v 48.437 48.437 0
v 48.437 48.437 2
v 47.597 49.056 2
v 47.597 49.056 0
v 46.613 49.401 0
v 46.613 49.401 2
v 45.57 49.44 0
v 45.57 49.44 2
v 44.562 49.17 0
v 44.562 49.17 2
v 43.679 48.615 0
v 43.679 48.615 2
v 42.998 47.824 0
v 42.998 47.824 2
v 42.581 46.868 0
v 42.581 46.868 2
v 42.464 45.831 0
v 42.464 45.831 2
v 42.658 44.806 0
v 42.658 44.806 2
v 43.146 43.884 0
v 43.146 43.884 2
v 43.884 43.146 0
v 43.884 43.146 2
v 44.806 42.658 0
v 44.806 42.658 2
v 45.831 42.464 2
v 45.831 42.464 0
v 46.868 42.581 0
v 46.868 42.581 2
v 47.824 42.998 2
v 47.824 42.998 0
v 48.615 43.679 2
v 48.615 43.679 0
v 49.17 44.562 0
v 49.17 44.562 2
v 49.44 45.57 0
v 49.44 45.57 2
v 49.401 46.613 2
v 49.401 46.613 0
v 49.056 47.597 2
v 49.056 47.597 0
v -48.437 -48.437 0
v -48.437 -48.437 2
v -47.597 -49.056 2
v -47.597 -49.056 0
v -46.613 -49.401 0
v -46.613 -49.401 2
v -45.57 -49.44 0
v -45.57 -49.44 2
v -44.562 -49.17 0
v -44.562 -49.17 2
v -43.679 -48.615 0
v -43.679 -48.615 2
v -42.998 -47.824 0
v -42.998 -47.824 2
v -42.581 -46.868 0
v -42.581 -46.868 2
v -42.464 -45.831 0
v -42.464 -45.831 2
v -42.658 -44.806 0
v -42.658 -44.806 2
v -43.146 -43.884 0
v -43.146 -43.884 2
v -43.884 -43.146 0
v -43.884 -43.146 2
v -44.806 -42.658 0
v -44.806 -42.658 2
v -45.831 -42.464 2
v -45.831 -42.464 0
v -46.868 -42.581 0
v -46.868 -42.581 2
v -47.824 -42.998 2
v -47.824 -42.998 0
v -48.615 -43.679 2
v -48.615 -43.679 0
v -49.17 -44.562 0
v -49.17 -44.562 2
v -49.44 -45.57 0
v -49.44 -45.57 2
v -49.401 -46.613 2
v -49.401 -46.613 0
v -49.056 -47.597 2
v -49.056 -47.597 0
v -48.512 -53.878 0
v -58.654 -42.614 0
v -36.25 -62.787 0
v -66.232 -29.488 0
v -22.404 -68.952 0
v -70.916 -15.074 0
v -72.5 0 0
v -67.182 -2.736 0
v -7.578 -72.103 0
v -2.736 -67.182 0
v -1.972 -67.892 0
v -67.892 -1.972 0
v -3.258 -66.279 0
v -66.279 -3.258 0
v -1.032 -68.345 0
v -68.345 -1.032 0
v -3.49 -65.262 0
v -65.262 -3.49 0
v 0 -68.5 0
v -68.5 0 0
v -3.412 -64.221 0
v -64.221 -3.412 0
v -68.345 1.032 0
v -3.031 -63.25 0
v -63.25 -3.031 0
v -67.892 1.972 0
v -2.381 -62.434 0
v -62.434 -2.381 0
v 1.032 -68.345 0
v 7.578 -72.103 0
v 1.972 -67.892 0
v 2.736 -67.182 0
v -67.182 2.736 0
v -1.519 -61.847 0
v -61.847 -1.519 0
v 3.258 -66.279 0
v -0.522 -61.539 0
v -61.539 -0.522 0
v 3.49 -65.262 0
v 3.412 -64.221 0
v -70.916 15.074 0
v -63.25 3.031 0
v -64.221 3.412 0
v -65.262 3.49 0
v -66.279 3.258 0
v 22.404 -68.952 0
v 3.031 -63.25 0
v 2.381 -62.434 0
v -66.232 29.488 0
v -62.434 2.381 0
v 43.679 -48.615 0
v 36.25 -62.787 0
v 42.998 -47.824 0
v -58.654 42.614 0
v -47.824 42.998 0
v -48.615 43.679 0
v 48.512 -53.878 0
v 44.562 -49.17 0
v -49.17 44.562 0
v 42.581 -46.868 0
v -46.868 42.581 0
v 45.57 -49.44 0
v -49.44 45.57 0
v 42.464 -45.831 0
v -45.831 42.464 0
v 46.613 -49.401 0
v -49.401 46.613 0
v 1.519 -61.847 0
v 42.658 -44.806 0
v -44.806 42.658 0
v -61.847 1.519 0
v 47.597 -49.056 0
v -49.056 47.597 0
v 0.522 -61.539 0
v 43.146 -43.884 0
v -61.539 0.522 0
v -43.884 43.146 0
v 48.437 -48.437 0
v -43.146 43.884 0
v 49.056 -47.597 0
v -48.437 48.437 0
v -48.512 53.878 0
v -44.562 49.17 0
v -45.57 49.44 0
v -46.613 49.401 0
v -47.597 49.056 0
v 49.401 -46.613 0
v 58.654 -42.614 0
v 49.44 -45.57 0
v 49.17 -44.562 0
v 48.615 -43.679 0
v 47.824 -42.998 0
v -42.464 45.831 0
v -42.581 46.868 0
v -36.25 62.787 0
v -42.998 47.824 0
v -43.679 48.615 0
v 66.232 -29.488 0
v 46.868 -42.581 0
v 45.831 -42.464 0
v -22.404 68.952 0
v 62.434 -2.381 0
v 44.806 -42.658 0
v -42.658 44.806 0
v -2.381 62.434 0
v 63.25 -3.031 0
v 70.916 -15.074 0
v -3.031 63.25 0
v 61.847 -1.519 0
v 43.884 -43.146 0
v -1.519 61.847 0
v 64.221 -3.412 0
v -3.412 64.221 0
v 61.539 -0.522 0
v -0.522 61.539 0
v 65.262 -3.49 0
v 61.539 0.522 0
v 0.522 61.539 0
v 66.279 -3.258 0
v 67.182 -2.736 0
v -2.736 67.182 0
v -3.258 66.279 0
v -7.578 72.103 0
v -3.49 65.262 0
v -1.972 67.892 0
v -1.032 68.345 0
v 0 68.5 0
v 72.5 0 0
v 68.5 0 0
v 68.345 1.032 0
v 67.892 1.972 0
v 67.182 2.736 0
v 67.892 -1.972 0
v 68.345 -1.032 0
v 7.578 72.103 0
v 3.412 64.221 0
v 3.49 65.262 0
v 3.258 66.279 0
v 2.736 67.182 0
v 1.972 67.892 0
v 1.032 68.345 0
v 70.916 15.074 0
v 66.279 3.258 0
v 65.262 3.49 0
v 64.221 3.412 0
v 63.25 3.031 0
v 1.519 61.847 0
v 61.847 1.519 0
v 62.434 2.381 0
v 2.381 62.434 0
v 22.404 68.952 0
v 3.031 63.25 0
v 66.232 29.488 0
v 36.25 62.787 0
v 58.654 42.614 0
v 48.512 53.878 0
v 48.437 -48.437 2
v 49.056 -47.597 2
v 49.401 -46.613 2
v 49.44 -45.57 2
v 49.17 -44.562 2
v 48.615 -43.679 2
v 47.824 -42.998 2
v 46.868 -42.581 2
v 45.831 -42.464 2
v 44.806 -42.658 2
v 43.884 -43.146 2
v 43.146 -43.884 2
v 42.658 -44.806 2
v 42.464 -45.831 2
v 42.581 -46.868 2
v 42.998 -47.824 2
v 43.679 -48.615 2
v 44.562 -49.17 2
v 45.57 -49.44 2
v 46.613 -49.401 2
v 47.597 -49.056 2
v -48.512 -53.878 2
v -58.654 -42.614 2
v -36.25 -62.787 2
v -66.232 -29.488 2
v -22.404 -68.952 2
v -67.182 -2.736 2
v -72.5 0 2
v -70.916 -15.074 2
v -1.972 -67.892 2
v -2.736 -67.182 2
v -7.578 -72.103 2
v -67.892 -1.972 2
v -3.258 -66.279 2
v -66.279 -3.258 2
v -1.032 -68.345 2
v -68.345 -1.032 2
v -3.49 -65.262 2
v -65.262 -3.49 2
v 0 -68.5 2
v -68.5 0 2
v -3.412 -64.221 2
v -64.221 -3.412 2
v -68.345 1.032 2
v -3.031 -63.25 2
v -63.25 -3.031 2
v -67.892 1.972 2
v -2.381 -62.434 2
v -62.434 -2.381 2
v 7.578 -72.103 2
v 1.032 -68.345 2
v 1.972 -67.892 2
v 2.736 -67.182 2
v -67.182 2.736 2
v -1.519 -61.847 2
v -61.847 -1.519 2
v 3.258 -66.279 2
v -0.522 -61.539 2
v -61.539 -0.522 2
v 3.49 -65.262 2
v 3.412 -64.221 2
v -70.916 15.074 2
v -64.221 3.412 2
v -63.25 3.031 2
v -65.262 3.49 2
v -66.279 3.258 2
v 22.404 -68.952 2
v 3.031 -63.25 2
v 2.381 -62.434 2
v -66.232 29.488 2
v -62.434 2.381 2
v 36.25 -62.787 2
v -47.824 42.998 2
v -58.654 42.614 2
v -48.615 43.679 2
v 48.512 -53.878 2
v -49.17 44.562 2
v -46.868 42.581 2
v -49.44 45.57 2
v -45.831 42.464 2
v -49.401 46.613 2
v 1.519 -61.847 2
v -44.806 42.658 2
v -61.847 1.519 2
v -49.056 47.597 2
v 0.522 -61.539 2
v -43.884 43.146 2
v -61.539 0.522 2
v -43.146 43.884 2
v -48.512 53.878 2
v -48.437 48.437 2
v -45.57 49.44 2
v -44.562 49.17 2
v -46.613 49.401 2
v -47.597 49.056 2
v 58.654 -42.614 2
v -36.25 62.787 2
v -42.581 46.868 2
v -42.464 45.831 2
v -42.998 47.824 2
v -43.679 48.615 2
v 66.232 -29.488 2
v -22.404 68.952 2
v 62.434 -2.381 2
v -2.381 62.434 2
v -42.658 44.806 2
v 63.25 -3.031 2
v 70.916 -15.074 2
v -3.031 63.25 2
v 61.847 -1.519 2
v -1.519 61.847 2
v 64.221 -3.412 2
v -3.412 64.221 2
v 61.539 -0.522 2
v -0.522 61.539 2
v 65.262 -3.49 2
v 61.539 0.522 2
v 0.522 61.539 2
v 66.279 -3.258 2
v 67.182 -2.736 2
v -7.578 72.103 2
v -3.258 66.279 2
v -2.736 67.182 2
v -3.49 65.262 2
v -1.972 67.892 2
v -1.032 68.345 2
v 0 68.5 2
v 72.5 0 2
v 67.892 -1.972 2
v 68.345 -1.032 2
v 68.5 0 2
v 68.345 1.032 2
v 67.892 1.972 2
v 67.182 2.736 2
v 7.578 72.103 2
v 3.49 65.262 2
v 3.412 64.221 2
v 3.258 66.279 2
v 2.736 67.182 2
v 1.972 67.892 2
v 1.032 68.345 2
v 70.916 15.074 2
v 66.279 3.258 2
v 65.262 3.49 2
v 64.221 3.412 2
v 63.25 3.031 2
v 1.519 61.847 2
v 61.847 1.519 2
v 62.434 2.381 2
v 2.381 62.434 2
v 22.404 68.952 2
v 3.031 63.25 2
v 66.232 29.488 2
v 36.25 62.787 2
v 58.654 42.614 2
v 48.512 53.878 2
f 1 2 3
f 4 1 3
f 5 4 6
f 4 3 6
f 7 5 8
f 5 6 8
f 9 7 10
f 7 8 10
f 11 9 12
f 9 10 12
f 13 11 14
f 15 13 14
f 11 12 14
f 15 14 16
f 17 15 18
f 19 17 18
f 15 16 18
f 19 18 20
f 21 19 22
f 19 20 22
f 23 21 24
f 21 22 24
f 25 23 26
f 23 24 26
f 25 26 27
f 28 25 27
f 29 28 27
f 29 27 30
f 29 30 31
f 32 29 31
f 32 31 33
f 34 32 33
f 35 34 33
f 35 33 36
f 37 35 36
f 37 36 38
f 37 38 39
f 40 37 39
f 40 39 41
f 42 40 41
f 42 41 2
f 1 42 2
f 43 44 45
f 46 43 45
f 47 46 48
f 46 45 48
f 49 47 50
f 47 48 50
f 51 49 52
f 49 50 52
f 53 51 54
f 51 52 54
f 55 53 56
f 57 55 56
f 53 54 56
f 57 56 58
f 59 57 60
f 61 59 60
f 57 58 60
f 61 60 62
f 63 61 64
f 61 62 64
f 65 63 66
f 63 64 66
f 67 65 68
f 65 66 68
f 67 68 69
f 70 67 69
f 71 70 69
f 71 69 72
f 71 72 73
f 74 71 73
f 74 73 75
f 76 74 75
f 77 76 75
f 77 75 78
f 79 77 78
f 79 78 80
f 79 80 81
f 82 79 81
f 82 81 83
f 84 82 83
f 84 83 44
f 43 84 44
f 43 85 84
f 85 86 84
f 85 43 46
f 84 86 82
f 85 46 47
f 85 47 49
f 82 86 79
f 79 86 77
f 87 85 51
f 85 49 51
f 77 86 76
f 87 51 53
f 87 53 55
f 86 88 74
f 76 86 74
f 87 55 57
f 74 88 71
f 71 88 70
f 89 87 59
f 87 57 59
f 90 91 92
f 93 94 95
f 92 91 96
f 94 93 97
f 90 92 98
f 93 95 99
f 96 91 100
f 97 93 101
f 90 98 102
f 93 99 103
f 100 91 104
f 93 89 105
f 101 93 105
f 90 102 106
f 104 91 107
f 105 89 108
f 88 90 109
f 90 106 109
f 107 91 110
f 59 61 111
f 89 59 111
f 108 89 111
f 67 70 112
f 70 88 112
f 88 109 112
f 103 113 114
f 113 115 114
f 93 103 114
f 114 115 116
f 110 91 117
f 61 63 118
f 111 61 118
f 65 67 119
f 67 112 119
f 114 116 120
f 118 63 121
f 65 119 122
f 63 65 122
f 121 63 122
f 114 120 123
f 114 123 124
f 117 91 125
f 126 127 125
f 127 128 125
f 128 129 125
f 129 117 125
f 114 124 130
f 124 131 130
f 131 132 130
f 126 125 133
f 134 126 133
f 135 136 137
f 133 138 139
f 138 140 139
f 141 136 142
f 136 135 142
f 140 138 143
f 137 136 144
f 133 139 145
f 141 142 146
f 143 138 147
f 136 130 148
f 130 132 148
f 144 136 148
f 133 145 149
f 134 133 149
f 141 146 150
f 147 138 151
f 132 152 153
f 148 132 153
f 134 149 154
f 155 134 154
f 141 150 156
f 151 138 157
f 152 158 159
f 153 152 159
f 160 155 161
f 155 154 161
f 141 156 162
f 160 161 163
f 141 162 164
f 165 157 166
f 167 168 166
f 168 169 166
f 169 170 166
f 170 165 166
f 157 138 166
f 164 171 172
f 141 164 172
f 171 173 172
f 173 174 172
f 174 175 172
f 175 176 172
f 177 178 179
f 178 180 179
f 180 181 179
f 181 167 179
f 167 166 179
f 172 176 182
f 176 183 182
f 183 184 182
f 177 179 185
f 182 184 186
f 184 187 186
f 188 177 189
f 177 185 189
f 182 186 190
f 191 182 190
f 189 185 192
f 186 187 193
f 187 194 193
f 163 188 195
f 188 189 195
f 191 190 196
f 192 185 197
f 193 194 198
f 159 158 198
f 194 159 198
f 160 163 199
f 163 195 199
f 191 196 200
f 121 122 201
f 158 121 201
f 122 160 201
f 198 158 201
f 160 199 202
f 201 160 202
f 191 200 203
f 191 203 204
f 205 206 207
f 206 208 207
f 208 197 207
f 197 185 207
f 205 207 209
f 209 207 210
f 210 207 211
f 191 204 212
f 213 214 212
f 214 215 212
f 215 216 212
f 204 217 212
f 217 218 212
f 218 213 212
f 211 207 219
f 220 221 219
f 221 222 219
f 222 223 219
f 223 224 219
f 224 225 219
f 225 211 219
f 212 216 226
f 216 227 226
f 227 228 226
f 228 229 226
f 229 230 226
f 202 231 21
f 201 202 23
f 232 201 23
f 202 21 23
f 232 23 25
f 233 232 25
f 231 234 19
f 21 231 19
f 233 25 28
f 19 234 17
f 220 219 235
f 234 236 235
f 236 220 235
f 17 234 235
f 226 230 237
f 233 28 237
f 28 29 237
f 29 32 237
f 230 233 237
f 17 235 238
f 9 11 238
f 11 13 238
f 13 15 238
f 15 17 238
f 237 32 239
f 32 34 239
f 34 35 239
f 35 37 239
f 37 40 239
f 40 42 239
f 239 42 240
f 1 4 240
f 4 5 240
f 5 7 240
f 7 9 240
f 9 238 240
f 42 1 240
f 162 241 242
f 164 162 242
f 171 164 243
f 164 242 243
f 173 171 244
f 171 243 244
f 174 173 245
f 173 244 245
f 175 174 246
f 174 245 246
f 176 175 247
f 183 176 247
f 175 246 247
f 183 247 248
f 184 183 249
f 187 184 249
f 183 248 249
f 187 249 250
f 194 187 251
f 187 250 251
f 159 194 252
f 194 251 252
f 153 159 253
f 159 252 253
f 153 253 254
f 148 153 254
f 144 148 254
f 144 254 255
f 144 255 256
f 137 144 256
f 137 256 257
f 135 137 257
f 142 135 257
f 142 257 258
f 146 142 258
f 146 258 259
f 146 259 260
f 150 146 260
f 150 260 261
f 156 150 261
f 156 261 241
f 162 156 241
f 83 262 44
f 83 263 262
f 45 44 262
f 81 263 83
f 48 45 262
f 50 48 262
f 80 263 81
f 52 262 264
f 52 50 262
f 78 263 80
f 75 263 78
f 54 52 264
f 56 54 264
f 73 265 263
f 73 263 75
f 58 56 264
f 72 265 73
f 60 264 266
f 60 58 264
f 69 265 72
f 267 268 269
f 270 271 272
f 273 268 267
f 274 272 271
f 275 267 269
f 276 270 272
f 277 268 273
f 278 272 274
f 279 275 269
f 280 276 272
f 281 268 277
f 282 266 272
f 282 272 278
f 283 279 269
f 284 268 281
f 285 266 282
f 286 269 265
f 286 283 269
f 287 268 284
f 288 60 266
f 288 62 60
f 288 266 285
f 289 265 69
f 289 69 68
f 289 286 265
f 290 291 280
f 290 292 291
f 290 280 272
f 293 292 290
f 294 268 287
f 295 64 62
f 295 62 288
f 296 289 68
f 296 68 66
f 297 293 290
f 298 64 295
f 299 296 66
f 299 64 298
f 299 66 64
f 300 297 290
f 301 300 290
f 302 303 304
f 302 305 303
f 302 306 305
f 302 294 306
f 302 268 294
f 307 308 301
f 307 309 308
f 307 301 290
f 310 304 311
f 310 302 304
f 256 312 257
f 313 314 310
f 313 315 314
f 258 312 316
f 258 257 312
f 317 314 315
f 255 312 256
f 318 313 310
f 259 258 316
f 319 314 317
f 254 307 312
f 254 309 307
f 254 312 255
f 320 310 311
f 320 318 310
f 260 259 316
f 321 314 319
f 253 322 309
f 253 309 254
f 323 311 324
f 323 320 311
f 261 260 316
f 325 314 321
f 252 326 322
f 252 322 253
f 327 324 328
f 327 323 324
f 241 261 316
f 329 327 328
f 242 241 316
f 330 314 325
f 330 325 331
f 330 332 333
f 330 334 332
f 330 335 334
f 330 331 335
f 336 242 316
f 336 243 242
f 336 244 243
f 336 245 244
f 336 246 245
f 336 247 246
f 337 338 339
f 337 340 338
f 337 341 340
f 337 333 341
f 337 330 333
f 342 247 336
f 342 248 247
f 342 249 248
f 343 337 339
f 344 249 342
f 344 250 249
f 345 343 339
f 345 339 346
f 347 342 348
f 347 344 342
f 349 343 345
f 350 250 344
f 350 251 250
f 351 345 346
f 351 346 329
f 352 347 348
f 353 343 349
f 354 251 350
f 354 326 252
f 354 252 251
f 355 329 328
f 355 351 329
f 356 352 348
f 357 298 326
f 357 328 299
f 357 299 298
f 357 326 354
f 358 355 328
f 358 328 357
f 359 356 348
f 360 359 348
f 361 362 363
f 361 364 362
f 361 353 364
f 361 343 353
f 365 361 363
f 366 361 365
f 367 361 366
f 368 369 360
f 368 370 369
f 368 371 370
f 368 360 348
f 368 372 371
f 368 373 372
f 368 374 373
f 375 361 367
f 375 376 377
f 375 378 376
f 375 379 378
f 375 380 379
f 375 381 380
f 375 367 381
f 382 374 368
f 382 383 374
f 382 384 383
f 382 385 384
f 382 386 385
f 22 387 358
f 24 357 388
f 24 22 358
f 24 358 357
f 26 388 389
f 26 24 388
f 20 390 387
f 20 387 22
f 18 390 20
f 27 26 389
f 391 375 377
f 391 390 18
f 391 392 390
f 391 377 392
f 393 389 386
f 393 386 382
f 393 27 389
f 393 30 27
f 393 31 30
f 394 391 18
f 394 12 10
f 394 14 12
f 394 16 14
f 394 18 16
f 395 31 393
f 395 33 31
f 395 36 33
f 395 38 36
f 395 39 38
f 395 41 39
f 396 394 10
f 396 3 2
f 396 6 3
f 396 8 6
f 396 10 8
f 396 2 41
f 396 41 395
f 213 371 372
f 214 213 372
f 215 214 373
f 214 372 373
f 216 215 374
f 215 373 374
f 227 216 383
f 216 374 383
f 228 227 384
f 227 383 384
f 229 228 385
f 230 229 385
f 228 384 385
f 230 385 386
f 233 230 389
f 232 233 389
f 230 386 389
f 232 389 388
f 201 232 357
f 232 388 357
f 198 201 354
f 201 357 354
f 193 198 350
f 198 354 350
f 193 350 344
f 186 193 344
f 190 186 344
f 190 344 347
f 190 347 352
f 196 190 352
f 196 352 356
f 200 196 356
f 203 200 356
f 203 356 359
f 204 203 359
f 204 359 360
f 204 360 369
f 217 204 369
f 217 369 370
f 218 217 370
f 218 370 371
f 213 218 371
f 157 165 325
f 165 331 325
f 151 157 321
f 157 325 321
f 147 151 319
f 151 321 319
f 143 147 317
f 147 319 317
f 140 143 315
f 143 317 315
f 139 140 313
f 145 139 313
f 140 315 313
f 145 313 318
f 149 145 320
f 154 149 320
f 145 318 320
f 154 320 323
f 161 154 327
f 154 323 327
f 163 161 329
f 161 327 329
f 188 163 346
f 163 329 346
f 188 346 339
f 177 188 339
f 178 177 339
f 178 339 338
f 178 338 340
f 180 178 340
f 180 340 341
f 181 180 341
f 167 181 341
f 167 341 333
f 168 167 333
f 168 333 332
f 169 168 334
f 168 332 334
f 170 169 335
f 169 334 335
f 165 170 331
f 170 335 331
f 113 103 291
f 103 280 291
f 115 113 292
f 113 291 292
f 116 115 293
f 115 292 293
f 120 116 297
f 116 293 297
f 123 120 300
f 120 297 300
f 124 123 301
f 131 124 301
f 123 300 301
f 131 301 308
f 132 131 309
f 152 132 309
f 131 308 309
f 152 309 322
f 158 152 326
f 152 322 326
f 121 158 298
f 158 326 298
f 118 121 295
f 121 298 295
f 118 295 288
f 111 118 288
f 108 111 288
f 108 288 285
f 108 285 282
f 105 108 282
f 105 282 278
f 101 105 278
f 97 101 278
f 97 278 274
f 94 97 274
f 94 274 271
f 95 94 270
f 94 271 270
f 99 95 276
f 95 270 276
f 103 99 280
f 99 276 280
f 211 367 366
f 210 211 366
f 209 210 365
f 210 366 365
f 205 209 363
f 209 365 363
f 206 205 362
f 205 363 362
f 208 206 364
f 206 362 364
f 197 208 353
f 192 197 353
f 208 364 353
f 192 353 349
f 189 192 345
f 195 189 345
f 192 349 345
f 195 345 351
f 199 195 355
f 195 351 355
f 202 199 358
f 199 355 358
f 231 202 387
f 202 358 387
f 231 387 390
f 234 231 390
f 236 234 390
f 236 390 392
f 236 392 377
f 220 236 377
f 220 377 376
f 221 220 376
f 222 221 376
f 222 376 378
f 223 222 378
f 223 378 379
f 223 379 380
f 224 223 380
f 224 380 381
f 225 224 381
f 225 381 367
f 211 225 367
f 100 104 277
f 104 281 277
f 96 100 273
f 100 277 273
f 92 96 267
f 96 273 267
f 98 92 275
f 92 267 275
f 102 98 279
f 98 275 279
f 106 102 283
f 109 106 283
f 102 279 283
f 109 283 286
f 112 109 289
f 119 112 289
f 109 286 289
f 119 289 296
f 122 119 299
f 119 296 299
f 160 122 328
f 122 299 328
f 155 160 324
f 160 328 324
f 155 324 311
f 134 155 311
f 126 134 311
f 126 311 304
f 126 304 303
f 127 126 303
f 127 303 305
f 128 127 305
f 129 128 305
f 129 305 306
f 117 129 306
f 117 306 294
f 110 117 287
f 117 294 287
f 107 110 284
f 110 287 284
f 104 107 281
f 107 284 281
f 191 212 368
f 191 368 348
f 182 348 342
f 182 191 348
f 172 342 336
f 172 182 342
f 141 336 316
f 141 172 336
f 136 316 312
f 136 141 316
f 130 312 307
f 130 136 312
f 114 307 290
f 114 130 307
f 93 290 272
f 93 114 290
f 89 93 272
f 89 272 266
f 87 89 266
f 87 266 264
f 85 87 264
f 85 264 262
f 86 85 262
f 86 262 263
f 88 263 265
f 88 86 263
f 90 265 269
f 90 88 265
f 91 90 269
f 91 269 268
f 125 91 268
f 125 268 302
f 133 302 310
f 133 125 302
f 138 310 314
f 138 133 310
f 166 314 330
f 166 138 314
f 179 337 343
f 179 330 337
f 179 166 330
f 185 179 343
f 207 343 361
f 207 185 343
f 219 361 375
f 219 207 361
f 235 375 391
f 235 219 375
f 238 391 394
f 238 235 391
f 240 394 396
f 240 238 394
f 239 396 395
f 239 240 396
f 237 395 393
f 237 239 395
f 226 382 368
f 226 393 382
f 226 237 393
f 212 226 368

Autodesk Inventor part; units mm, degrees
ref_plane "YZ Plane" through (0, 0, 0) normal (1, 0, 0) x (0, 1, 0)
ref_plane "XZ Plane" through (0, 0, 0) normal (0, 1, 0) x (-1, 0, 0)
ref_plane "XY Plane" through (0, 0, 0) normal (0, 0, 1) x (1, 0, 0)
sketch "Sketch1" plane through (0, 0, 0) normal (0, 0, 1) x (1, 0, 0)
  circle A0 centre (0, 0) radius 72.5
  dimension "d22" = 145
extrude "Plate1" add sketch "Sketch1" along normal blind 2
sketch "Sketch6" plane through (0, 0, 2) normal (0, 0, 1) x (1, 0, 0)
  circle A0 centre (65, 0) radius 3.5
  circle A1 centre (0, 0) radius 65 construction
  dimension "d37" = 130
  dimension "d36" = 7
extrude "Cut2" cut sketch "Sketch6" against normal blind 2
pattern_circular "Circular Pattern2" count 8 over 360 about axis through (0, 0, 0) along (0, 0, 1) of "Cut2"
equation "\"d38\" = Thickness"
equation "\"d2\" = Thickness"
equation "\"BendReliefWidth\" = Thickness"
equation "\"BendReliefDepth\" = 0.5 * Thickness"
equation "\"CornerReliefSize\" = 4 * Thickness"
equation "\"MinimumRemnant\" = 2 * Thickness"
equation "\"TransitionRadius\" = BendRadius"
equation "\"JacobiRadiusSize\" = BendRadius"
equation "\"GapSize\" = Thickness"
equation "\"Thickness\" = 2"
equation "\"BendRadius\" = 5"
properties part number "TKS 3556 BOTTOM DS cup plug" material "Stainless Steel"
